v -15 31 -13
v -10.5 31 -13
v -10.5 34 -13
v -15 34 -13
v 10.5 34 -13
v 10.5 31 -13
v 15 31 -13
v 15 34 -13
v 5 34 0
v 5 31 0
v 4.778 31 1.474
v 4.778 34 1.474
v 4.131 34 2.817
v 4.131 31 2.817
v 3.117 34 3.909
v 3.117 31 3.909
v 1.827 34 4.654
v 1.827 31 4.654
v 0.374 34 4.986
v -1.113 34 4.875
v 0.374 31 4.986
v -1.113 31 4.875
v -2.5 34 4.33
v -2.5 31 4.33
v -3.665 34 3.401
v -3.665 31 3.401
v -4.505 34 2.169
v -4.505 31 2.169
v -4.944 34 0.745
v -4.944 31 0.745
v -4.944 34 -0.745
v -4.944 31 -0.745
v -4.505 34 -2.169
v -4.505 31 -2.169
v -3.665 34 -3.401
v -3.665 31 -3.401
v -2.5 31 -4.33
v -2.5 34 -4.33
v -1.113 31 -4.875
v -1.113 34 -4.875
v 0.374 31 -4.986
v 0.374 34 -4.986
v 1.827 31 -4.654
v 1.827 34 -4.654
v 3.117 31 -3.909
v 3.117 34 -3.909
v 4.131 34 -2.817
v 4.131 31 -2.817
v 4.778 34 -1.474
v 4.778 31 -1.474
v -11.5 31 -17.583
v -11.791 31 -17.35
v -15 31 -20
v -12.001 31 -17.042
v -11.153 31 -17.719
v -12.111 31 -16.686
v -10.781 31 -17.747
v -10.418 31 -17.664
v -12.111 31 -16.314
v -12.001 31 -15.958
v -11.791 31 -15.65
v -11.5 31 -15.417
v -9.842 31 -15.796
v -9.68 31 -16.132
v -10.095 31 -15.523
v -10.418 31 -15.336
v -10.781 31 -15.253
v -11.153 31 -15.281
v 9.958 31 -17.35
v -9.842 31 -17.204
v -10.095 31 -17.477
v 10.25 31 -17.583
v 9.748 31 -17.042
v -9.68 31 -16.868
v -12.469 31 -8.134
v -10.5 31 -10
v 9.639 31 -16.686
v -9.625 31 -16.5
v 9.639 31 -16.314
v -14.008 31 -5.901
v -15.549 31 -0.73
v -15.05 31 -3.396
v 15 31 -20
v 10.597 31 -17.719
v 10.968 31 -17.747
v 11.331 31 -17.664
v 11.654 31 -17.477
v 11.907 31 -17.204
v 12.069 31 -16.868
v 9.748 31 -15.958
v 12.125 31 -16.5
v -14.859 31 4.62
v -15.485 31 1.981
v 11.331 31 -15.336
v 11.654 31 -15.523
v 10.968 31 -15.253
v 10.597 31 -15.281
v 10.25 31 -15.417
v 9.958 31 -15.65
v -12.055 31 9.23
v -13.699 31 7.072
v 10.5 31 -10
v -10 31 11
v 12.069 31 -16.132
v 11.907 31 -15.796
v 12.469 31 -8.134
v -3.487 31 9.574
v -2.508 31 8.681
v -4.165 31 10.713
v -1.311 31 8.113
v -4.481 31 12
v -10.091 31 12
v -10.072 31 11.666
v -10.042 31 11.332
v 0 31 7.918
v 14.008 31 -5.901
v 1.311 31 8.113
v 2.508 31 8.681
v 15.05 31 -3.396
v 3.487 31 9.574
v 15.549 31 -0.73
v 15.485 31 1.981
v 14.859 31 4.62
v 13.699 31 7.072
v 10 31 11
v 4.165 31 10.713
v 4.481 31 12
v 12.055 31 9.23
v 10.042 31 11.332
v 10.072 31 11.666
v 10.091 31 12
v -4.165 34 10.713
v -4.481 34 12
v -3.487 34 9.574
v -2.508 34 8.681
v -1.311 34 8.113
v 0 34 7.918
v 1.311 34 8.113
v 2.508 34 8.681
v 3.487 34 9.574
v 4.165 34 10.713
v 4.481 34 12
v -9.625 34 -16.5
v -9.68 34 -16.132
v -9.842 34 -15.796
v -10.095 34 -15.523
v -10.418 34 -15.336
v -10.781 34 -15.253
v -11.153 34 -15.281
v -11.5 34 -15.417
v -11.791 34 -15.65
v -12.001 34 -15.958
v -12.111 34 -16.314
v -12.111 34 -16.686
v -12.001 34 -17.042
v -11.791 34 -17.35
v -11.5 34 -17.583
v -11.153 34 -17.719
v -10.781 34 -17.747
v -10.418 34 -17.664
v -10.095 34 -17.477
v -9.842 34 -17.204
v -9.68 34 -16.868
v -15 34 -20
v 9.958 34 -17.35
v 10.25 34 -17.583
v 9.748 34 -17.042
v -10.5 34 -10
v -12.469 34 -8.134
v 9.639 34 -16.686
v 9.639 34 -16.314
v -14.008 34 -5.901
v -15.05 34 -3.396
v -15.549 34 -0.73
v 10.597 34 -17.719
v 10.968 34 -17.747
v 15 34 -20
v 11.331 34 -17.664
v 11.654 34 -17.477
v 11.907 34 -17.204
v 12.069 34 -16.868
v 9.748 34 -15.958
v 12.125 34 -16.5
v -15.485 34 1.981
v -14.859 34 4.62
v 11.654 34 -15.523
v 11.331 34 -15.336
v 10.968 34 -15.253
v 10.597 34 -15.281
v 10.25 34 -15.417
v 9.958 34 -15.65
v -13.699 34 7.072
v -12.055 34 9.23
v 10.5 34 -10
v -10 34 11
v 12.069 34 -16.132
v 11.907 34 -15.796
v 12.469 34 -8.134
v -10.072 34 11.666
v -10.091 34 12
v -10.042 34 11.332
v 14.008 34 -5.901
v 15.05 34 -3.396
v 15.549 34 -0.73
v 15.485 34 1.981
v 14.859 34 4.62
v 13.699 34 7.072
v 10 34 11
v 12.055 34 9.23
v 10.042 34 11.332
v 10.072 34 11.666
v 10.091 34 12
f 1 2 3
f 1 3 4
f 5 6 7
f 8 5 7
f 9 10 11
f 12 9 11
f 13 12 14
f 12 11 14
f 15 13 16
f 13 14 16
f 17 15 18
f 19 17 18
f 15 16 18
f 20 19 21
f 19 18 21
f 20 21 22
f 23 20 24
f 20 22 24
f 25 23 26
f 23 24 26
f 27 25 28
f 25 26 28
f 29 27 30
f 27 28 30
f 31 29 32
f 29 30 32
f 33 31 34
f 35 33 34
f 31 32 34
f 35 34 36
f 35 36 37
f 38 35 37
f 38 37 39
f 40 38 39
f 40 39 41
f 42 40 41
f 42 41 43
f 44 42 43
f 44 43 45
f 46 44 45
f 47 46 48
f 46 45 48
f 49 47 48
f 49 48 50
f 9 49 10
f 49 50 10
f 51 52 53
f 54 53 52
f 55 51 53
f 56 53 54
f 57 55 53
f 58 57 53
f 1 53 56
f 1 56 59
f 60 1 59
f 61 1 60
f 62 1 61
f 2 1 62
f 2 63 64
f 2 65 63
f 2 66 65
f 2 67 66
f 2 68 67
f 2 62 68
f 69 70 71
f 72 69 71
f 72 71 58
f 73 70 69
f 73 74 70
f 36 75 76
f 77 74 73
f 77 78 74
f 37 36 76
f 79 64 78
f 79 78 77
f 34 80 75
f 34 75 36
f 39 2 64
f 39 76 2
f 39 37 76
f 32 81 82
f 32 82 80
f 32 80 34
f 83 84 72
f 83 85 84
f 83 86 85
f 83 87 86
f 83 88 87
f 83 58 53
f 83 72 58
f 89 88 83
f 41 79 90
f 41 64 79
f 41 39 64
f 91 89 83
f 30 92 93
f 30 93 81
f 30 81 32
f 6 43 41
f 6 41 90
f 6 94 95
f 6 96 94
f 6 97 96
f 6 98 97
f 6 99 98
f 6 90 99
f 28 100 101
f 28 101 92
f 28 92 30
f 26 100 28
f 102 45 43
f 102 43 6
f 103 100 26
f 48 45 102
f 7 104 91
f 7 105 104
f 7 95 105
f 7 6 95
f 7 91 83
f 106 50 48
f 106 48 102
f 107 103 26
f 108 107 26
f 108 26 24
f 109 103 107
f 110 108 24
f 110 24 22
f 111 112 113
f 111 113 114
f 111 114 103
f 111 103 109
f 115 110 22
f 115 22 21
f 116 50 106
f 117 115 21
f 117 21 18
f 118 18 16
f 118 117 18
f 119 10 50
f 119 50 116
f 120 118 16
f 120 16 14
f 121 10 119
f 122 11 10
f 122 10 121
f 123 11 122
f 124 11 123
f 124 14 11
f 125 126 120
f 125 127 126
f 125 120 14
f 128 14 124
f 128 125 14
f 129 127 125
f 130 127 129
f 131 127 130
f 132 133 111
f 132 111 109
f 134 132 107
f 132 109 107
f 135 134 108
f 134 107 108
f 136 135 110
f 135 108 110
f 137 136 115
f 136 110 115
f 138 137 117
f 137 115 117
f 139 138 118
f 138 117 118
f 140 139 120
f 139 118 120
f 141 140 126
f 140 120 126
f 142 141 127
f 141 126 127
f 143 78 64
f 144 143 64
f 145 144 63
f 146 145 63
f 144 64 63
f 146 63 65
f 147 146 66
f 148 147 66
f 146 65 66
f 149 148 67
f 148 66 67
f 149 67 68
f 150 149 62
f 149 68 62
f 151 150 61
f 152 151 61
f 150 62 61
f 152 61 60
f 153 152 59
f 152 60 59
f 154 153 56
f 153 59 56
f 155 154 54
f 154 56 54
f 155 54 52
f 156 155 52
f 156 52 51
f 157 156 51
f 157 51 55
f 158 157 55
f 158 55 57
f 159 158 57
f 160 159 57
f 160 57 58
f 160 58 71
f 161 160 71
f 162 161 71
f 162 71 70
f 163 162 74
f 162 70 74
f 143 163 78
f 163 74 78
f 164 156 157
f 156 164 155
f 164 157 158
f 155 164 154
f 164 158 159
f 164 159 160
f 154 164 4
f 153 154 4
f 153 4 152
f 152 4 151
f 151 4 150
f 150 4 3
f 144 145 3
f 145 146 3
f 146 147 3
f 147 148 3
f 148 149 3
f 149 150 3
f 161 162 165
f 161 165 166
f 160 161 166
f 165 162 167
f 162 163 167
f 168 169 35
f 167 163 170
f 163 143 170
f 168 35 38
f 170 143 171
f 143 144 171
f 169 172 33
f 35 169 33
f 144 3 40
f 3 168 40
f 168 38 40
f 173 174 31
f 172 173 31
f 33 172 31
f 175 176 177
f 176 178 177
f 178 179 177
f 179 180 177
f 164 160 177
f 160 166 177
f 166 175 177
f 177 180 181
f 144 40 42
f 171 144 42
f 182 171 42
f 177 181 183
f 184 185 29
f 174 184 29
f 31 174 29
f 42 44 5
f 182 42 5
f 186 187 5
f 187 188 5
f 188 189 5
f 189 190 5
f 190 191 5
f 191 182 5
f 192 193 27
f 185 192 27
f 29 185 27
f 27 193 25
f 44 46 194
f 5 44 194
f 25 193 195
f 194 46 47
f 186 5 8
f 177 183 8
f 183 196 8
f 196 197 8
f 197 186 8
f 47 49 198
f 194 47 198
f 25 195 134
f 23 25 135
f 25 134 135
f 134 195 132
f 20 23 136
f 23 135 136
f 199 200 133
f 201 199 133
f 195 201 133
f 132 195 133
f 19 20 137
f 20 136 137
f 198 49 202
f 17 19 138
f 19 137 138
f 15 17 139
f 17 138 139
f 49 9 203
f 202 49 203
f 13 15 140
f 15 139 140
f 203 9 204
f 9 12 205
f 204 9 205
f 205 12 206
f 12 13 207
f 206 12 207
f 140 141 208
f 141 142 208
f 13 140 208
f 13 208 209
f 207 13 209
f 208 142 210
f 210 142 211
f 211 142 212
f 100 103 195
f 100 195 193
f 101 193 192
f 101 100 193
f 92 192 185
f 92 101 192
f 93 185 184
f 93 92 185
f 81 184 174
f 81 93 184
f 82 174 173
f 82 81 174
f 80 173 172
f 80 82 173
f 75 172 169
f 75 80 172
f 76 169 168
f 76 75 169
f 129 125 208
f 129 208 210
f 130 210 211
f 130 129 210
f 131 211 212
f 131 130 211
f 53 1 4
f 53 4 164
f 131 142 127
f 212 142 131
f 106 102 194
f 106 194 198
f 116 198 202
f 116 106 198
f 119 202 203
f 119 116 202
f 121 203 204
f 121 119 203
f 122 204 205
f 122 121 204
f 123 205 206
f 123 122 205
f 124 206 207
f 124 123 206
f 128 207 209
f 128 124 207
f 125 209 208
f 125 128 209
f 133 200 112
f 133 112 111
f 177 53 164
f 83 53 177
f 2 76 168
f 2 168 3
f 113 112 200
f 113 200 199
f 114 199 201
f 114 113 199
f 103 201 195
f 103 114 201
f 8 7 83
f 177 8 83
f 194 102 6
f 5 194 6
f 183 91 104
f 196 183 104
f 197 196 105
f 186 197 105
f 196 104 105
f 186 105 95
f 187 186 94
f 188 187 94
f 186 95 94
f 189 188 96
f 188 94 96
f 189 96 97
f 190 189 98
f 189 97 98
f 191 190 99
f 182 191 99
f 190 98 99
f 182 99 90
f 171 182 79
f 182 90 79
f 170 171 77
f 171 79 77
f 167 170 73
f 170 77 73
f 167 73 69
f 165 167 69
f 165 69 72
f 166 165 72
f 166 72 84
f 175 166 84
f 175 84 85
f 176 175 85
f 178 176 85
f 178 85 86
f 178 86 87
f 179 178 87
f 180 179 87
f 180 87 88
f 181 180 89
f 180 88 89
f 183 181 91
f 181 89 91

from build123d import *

# Parameters (mm, degrees)
BOX044_W         = 24
BOX044_H         = 42
BOX044_DEPTH     = 13
SKETCH022_R      = 5
SKETCH022_R_2    = 4.5
SKETCH022_R_3    = 1.25
EXTRUDE022_DEPTH = 3
BOX039_W         = 3
BOX039_H         = 2
BOX039_DEPTH     = 2


with BuildPart() as cube005:
    # Box044 → Box044 (new body)
    with BuildSketch(Plane(origin=(-12, -2, 12), x_dir=(1, 0, 0), z_dir=(0, 0, 1))):
        with Locations((12, 21)):
            Rectangle(BOX044_W, BOX044_H)
    extrude(amount=BOX044_DEPTH)


with BuildPart() as back_cover:
    # Sketch022 → Extrude022 (new body)
    with BuildSketch(Plane.XZ):
        with BuildLine():
            ThreePointArc((10, 11), (0, 22.517745), (-10, 11))
            ThreePointArc((-10, 11), (-15.587711, 0.627088), (-10.5, -10))
            Line((-10.5, -10), (-10.5, -13))
            Line((-10.5, -13), (-15, -13))
            Line((-15, -13), (-15, -20))
            Line((-15, -20), (15, -20))
            Line((15, -13), (15, -20))
            Line((10.5, -13), (15, -13))
            Line((10.5, -10), (10.5, -13))
            ThreePointArc((10.5, -10), (15.587711, 0.627088), (10, 11))
        make_face()
        Circle(SKETCH022_R, mode=Mode.SUBTRACT)
        with Locations((0, 12.417745)):
            Circle(SKETCH022_R_2, mode=Mode.SUBTRACT)
        with Locations((-10.8747, -16.5)):
            Circle(SKETCH022_R_3, mode=Mode.SUBTRACT)
        with Locations((10.8747, -16.5)):
            Circle(SKETCH022_R_3, mode=Mode.SUBTRACT)
    extrude(amount=-EXTRUDE022_DEPTH)


with BuildPart() as back_cover_1:
    # Extrude022 placement: moved
    add(back_cover.part.moved(Location((0, 31, 0))))


with BuildPart() as cover:
    # Box039 → Box039 (new body)
    with BuildSketch(Plane(origin=(-1.5, 29, 19.5), x_dir=(1, 0, 0), z_dir=(0, 0, 1))):
        with Locations((1.5, 1)):
            Rectangle(BOX039_W, BOX039_H)
    extrude(amount=BOX039_DEPTH)

    # Fusion025: union Back_cover
    add(back_cover_1.part)

    # Cut032: cut Cube005
    add(cube005.part, mode=Mode.SUBTRACT)


solid = cover.part
